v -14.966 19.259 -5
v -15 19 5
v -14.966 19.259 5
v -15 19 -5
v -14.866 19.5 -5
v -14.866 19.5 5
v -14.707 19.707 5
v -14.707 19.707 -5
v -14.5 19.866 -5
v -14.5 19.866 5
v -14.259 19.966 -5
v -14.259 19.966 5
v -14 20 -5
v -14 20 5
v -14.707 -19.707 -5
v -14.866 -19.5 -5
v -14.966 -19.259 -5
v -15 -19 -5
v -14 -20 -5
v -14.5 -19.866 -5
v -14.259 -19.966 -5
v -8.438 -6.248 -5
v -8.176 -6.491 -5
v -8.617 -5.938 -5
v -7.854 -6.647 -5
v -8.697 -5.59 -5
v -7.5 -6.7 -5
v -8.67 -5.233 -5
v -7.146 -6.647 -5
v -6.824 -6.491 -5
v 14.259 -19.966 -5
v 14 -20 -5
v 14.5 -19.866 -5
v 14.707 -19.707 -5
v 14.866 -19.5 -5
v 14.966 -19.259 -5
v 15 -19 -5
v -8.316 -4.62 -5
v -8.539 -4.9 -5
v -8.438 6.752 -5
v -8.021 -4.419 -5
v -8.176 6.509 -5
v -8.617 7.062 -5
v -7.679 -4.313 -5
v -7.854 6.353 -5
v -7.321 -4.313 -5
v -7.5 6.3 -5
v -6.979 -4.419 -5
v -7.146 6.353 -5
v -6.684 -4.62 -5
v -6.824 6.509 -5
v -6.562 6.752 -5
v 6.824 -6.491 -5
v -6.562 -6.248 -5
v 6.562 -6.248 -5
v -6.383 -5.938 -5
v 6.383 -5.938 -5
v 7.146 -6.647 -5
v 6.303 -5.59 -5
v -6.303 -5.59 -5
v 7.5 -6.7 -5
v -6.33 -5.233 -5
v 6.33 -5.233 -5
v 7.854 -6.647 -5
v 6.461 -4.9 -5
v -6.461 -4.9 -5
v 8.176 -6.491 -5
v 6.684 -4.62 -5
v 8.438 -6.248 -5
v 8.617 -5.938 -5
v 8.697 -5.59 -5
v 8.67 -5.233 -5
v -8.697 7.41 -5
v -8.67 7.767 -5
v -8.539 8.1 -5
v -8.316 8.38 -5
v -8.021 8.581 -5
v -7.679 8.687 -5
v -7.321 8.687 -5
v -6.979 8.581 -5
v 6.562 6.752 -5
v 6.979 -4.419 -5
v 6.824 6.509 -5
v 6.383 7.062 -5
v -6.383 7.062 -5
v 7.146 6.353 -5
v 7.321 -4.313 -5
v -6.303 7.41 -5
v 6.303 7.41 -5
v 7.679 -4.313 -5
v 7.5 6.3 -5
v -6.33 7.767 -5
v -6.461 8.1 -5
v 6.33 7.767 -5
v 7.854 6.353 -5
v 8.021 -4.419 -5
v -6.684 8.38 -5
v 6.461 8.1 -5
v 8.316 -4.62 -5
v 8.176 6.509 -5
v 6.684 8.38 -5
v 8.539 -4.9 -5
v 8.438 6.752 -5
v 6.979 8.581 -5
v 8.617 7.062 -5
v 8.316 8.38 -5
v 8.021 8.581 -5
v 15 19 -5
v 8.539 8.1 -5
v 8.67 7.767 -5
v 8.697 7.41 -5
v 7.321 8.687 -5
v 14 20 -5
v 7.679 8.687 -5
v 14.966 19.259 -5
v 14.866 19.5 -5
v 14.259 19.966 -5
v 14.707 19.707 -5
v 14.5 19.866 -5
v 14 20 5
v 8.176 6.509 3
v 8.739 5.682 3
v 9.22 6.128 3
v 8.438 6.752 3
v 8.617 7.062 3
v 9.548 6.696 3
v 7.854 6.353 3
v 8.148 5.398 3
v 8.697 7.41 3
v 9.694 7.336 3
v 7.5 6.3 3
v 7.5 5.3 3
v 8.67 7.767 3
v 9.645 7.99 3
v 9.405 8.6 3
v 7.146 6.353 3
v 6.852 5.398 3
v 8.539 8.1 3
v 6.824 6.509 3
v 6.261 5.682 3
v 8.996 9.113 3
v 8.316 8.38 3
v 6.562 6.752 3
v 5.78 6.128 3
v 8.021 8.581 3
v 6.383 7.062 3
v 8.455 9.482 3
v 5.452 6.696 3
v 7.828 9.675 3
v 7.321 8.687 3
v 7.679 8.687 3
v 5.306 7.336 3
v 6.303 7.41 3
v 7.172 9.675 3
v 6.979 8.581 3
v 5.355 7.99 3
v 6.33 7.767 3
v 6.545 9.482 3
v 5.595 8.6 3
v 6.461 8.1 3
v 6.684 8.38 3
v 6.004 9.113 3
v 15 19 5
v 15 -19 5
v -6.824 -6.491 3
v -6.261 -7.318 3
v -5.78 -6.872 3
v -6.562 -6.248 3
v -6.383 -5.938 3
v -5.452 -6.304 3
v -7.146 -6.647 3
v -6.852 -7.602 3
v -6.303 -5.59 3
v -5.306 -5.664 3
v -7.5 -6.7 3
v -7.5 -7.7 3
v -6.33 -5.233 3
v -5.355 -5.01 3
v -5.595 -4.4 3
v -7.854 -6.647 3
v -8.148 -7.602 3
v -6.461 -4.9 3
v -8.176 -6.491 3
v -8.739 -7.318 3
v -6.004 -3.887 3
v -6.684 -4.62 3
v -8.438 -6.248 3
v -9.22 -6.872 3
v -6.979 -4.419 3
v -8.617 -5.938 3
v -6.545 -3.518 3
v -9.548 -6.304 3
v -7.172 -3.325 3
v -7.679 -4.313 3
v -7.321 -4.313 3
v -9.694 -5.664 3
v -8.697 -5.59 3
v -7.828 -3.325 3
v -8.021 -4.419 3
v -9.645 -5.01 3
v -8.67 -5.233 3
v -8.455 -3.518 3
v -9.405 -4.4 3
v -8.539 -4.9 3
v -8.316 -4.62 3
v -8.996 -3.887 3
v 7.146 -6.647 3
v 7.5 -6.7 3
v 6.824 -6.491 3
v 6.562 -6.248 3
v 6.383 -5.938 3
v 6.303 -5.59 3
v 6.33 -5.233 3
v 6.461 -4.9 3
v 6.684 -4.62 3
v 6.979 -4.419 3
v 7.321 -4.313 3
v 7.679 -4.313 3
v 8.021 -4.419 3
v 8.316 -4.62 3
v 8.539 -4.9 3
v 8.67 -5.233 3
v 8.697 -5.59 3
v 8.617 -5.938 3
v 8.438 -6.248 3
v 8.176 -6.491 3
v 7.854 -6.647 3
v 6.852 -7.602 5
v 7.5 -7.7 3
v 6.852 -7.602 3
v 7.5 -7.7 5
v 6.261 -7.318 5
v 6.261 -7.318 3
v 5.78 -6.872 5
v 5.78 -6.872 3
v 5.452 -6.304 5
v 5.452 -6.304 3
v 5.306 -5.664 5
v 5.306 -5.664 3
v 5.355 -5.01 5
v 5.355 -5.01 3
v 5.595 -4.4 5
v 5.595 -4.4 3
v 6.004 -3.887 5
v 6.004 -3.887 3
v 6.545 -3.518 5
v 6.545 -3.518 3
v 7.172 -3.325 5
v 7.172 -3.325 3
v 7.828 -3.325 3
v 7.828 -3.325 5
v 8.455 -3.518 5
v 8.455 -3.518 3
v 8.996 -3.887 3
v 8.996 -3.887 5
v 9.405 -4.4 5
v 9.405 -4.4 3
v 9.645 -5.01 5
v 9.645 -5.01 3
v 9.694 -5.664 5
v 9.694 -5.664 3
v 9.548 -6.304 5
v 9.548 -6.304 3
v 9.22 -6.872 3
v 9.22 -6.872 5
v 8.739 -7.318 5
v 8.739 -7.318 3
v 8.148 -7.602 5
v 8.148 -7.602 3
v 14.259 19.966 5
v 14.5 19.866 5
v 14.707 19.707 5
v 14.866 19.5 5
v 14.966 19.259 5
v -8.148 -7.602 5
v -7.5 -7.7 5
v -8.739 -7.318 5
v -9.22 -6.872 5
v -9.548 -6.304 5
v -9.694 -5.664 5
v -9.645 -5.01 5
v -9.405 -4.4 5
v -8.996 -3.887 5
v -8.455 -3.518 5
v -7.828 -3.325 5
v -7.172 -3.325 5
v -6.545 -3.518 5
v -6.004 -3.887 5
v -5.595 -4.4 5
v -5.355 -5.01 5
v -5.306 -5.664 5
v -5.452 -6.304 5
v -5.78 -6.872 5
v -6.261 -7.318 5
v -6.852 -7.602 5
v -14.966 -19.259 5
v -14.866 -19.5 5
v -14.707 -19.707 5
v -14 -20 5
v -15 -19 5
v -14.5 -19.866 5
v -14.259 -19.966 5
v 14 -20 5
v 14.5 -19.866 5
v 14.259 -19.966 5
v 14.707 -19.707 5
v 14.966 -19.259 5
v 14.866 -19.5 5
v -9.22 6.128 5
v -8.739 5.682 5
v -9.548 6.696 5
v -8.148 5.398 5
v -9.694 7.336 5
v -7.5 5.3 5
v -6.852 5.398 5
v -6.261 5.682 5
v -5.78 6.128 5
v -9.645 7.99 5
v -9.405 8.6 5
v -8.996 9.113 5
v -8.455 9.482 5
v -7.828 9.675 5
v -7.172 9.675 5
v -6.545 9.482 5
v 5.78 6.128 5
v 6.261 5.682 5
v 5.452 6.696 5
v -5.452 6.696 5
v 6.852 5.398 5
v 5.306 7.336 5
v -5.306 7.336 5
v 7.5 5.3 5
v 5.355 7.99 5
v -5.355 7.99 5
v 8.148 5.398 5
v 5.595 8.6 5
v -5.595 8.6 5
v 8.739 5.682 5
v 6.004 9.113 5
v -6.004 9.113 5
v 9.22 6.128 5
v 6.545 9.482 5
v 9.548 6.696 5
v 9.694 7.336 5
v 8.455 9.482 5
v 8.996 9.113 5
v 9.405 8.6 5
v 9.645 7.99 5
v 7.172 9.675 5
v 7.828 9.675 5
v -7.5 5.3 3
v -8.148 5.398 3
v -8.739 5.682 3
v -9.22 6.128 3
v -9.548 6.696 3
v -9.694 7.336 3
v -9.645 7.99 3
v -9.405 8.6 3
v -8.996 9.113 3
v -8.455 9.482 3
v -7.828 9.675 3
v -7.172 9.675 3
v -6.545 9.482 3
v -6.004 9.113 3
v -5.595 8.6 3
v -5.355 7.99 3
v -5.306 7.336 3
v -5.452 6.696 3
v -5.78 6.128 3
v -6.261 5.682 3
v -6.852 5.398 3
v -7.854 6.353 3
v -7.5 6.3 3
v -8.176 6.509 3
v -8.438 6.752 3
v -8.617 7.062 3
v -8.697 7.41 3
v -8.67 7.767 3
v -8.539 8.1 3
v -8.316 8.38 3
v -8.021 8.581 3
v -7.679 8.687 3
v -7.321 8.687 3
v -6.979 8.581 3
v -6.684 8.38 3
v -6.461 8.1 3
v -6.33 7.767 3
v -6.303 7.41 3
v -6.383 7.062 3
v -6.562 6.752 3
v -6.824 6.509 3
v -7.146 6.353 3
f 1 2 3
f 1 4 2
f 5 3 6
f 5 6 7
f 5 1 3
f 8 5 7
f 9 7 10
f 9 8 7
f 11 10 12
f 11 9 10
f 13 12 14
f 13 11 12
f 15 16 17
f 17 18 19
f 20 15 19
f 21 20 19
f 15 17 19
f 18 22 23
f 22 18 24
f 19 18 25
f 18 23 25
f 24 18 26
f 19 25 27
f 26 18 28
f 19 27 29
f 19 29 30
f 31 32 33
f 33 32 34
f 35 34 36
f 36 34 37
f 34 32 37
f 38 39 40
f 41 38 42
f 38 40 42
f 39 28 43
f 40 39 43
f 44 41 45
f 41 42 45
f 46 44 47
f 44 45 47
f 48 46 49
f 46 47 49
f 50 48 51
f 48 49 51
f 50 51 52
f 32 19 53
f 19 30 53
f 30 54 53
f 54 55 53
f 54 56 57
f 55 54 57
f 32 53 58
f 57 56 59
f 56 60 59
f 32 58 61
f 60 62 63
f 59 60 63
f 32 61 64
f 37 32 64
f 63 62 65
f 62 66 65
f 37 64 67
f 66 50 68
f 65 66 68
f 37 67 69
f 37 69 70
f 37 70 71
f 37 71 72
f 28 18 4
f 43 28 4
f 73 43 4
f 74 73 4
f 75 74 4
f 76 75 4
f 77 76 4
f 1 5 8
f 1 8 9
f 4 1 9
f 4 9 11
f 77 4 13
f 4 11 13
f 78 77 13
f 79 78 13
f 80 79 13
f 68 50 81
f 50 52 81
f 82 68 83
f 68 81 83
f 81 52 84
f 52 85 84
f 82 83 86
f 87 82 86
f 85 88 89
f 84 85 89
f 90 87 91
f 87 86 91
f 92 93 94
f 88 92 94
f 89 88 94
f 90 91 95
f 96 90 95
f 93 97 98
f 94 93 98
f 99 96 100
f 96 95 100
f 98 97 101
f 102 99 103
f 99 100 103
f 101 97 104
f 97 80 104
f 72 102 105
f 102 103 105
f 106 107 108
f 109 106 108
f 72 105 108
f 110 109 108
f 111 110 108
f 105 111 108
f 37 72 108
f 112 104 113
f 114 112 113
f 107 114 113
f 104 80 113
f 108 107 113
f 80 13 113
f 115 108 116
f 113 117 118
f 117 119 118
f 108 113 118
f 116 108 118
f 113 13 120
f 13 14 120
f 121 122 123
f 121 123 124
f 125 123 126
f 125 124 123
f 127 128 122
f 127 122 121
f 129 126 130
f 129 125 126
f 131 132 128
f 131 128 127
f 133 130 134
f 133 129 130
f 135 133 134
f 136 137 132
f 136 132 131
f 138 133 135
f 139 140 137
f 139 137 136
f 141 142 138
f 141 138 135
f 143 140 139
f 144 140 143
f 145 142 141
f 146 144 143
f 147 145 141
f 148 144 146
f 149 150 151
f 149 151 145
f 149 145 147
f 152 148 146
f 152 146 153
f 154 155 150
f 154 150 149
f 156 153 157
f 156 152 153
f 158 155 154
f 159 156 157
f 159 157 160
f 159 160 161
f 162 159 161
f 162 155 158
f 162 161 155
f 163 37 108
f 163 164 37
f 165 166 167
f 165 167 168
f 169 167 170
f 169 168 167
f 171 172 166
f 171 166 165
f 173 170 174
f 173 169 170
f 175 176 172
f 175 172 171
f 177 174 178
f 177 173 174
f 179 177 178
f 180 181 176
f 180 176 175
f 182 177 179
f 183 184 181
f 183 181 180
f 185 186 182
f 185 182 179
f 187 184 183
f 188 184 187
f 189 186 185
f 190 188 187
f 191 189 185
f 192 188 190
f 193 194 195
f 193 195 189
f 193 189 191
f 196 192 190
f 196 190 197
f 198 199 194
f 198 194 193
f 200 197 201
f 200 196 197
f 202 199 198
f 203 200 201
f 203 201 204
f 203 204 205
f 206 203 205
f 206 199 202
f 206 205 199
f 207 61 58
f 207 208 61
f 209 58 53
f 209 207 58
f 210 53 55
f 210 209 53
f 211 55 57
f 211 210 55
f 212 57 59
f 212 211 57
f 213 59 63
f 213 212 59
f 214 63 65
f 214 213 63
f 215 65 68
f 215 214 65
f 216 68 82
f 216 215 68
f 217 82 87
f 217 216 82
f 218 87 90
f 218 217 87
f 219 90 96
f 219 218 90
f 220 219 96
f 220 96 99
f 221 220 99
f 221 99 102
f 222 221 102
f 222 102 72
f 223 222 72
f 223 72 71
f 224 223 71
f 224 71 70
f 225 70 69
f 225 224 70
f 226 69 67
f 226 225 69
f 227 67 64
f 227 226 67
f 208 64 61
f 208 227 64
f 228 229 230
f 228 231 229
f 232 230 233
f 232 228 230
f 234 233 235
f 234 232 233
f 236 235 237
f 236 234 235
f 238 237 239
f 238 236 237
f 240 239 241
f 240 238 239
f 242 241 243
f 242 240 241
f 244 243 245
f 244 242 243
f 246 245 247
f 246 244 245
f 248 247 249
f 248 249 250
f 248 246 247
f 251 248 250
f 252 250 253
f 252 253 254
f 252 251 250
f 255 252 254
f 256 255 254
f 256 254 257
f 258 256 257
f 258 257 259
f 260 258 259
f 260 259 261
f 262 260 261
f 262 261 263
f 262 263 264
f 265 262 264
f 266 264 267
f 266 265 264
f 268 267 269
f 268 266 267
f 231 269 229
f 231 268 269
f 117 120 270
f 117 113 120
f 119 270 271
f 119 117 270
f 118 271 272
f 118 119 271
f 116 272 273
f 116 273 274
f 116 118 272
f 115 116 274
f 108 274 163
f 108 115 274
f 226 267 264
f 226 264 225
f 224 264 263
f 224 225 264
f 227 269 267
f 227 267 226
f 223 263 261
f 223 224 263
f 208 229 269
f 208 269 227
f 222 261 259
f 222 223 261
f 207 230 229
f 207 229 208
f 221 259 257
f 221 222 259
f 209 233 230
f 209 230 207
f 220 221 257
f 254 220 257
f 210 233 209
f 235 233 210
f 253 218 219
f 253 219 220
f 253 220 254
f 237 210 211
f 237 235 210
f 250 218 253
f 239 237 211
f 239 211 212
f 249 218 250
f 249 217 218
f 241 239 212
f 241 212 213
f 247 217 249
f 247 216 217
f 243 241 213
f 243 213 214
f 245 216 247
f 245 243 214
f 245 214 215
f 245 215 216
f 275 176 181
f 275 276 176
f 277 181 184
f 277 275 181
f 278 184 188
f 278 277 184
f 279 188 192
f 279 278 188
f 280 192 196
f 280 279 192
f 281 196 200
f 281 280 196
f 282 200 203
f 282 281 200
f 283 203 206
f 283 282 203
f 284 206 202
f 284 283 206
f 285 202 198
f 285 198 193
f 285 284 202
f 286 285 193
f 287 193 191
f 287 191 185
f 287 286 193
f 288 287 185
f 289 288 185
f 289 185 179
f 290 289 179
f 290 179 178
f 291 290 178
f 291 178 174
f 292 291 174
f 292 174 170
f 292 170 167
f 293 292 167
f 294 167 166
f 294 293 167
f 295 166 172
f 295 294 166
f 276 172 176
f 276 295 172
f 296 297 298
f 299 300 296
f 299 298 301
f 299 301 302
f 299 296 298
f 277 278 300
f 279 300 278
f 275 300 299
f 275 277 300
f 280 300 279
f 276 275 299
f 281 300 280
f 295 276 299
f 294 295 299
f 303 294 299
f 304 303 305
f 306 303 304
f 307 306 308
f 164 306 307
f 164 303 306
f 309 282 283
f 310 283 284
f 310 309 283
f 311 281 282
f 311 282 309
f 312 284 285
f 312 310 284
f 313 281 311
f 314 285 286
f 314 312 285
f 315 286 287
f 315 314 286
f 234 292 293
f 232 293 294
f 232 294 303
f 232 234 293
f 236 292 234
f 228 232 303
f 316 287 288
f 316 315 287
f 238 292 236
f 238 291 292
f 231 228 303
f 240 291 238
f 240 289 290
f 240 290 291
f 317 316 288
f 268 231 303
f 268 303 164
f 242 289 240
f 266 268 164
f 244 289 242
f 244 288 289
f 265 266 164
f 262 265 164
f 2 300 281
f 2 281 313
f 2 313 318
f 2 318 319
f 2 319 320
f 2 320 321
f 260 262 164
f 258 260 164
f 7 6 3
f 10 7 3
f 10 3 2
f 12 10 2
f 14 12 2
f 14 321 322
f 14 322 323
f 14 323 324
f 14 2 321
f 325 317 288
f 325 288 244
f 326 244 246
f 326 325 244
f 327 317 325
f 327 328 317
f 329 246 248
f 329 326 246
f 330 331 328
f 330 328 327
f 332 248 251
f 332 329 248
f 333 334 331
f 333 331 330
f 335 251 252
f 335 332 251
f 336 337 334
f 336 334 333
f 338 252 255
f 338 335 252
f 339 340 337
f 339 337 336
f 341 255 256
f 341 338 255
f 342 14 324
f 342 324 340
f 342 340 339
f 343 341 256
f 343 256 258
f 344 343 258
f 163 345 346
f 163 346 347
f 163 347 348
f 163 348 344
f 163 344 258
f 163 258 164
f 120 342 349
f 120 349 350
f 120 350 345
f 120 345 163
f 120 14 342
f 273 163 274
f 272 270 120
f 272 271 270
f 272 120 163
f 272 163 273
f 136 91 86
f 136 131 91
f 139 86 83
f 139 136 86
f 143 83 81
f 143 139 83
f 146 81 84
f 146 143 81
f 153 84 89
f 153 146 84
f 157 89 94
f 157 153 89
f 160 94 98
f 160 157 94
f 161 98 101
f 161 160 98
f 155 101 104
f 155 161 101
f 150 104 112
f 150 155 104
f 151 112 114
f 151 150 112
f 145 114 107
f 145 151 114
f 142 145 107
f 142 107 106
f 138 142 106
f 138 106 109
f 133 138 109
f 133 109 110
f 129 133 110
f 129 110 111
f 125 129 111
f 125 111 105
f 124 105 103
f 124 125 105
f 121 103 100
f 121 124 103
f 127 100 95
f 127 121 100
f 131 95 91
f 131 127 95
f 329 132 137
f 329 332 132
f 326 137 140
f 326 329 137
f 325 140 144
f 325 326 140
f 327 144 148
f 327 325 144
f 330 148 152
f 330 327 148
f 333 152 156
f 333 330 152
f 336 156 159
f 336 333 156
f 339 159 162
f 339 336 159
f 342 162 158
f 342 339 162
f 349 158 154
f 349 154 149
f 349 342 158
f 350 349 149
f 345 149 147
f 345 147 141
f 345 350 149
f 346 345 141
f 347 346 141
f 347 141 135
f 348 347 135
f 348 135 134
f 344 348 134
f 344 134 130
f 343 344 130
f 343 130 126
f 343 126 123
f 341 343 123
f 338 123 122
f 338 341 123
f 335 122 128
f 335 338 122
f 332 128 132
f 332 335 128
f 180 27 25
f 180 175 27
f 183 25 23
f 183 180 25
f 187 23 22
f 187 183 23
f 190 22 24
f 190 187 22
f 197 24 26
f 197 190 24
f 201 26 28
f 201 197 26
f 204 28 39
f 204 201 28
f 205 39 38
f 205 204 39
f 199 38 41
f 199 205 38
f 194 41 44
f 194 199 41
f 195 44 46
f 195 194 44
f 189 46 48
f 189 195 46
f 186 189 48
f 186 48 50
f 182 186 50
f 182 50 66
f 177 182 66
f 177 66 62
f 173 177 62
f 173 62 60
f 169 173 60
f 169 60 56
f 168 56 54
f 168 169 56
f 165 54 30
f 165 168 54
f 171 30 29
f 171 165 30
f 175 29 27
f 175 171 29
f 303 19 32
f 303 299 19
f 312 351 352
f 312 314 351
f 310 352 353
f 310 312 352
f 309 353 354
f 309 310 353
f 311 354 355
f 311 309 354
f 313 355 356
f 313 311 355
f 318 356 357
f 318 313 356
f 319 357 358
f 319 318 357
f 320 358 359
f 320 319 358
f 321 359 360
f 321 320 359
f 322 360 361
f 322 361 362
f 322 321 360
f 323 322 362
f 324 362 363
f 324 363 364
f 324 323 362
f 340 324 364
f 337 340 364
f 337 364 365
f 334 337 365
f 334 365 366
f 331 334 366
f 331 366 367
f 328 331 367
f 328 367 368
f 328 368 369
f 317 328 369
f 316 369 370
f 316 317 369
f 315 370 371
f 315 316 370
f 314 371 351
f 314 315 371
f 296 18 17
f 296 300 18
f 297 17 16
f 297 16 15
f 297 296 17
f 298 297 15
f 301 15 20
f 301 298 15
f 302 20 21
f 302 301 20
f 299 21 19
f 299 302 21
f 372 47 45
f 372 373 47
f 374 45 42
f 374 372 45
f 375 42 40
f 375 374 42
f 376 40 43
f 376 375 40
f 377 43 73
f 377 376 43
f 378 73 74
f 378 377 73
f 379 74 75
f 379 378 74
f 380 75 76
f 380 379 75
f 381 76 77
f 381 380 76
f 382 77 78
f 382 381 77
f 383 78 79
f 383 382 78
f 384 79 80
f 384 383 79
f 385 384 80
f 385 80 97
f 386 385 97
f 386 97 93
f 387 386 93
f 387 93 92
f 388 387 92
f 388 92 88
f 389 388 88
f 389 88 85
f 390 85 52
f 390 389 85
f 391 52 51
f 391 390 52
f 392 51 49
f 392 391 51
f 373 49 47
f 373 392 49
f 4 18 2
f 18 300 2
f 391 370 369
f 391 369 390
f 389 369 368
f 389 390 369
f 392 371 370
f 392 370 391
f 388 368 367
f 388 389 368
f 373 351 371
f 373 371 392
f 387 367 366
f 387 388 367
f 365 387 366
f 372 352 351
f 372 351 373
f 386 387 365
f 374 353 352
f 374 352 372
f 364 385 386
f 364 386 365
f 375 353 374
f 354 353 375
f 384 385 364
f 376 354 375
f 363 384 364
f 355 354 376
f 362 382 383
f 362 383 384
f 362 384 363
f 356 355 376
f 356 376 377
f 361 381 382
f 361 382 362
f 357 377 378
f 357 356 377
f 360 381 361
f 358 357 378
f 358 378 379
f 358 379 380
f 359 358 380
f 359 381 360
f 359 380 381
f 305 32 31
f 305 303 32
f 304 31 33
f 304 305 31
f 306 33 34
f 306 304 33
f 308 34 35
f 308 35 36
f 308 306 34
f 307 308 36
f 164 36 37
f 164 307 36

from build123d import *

# Parameters (mm, degrees)
SKETCH1_W                              = 30
SKETCH1_H                              = 40
BODY_DEPTH                             = 5
CBORE_FOR_M2_HEX_HEAD_BOLT2_AT_2_COUNT = 2
CBORE_FOR_M2_HEX_HEAD_BOLT2_AT_2_PITCH = 15
LPATTERN1_COUNT                        = 2
LPATTERN1_PITCH                        = 13
FILLET1_R                              = 1


with BuildPart() as part:
    # Sketch1 → Body (new body, symmetric)
    with BuildSketch(Plane.XY):
        Rectangle(SKETCH1_W, SKETCH1_H)
    extrude(amount=BODY_DEPTH, both=True)

    # Sketch6 → CBORE for M2 Hex Head Bolt2 (revolve, cut)
    with BuildSketch(Plane(origin=(-7.5, 7.5, 5), x_dir=(0, -1, 0), z_dir=(1, 0, 0))):
        Polygon((0, 0), (0, 10.721032743), (1.2, 10), (1.2, 2), (2.2, 2), (2.2, 0), align=None)
    cbore_for_m2_hex_head_bolt2 = revolve(axis=Axis((-7.5, 7.5, 11.35), (0, 0, -1)), mode=Mode.SUBTRACT)

    # CBORE for M2 Hex Head Bolt2 at 2: CBORE for M2 Hex Head Bolt2 ×2
    with Locations(*[(i * CBORE_FOR_M2_HEX_HEAD_BOLT2_AT_2_PITCH, 0, 0) for i in range(1, CBORE_FOR_M2_HEX_HEAD_BOLT2_AT_2_COUNT)]):
        add(cbore_for_m2_hex_head_bolt2, mode=Mode.SUBTRACT)

    # LPattern1: CBORE for M2 Hex Head Bolt2 ×2
    with Locations(*[(0, -i * LPATTERN1_PITCH, 0) for i in range(1, LPATTERN1_COUNT)]):
        add(cbore_for_m2_hex_head_bolt2, mode=Mode.SUBTRACT)

    # LPattern1 copy 1 sketch → LPattern1 copy 1 (revolve, cut)
    with BuildSketch(Plane(origin=(7.5, -5.5, 5), x_dir=(0, -1, 0), z_dir=(1, 0, 0))):
        Polygon((0, 0), (0, 10.721032743), (1.2, 10), (1.2, 2), (2.2, 2), (2.2, 0), align=None)
    revolve(axis=Axis((7.5, -5.5, 11.35), (0, 0, -1)), mode=Mode.SUBTRACT)

    # Fillet1
    fillet1_edges = [part.edges().sort_by_distance(p)[0] for p in [
        (15, -20, 0),
        (-15, -20, 0),
        (-15, 20, 0),
        (15, 20, 0),
    ]]
    fillet(fillet1_edges, radius=FILLET1_R)


solid = part.part
